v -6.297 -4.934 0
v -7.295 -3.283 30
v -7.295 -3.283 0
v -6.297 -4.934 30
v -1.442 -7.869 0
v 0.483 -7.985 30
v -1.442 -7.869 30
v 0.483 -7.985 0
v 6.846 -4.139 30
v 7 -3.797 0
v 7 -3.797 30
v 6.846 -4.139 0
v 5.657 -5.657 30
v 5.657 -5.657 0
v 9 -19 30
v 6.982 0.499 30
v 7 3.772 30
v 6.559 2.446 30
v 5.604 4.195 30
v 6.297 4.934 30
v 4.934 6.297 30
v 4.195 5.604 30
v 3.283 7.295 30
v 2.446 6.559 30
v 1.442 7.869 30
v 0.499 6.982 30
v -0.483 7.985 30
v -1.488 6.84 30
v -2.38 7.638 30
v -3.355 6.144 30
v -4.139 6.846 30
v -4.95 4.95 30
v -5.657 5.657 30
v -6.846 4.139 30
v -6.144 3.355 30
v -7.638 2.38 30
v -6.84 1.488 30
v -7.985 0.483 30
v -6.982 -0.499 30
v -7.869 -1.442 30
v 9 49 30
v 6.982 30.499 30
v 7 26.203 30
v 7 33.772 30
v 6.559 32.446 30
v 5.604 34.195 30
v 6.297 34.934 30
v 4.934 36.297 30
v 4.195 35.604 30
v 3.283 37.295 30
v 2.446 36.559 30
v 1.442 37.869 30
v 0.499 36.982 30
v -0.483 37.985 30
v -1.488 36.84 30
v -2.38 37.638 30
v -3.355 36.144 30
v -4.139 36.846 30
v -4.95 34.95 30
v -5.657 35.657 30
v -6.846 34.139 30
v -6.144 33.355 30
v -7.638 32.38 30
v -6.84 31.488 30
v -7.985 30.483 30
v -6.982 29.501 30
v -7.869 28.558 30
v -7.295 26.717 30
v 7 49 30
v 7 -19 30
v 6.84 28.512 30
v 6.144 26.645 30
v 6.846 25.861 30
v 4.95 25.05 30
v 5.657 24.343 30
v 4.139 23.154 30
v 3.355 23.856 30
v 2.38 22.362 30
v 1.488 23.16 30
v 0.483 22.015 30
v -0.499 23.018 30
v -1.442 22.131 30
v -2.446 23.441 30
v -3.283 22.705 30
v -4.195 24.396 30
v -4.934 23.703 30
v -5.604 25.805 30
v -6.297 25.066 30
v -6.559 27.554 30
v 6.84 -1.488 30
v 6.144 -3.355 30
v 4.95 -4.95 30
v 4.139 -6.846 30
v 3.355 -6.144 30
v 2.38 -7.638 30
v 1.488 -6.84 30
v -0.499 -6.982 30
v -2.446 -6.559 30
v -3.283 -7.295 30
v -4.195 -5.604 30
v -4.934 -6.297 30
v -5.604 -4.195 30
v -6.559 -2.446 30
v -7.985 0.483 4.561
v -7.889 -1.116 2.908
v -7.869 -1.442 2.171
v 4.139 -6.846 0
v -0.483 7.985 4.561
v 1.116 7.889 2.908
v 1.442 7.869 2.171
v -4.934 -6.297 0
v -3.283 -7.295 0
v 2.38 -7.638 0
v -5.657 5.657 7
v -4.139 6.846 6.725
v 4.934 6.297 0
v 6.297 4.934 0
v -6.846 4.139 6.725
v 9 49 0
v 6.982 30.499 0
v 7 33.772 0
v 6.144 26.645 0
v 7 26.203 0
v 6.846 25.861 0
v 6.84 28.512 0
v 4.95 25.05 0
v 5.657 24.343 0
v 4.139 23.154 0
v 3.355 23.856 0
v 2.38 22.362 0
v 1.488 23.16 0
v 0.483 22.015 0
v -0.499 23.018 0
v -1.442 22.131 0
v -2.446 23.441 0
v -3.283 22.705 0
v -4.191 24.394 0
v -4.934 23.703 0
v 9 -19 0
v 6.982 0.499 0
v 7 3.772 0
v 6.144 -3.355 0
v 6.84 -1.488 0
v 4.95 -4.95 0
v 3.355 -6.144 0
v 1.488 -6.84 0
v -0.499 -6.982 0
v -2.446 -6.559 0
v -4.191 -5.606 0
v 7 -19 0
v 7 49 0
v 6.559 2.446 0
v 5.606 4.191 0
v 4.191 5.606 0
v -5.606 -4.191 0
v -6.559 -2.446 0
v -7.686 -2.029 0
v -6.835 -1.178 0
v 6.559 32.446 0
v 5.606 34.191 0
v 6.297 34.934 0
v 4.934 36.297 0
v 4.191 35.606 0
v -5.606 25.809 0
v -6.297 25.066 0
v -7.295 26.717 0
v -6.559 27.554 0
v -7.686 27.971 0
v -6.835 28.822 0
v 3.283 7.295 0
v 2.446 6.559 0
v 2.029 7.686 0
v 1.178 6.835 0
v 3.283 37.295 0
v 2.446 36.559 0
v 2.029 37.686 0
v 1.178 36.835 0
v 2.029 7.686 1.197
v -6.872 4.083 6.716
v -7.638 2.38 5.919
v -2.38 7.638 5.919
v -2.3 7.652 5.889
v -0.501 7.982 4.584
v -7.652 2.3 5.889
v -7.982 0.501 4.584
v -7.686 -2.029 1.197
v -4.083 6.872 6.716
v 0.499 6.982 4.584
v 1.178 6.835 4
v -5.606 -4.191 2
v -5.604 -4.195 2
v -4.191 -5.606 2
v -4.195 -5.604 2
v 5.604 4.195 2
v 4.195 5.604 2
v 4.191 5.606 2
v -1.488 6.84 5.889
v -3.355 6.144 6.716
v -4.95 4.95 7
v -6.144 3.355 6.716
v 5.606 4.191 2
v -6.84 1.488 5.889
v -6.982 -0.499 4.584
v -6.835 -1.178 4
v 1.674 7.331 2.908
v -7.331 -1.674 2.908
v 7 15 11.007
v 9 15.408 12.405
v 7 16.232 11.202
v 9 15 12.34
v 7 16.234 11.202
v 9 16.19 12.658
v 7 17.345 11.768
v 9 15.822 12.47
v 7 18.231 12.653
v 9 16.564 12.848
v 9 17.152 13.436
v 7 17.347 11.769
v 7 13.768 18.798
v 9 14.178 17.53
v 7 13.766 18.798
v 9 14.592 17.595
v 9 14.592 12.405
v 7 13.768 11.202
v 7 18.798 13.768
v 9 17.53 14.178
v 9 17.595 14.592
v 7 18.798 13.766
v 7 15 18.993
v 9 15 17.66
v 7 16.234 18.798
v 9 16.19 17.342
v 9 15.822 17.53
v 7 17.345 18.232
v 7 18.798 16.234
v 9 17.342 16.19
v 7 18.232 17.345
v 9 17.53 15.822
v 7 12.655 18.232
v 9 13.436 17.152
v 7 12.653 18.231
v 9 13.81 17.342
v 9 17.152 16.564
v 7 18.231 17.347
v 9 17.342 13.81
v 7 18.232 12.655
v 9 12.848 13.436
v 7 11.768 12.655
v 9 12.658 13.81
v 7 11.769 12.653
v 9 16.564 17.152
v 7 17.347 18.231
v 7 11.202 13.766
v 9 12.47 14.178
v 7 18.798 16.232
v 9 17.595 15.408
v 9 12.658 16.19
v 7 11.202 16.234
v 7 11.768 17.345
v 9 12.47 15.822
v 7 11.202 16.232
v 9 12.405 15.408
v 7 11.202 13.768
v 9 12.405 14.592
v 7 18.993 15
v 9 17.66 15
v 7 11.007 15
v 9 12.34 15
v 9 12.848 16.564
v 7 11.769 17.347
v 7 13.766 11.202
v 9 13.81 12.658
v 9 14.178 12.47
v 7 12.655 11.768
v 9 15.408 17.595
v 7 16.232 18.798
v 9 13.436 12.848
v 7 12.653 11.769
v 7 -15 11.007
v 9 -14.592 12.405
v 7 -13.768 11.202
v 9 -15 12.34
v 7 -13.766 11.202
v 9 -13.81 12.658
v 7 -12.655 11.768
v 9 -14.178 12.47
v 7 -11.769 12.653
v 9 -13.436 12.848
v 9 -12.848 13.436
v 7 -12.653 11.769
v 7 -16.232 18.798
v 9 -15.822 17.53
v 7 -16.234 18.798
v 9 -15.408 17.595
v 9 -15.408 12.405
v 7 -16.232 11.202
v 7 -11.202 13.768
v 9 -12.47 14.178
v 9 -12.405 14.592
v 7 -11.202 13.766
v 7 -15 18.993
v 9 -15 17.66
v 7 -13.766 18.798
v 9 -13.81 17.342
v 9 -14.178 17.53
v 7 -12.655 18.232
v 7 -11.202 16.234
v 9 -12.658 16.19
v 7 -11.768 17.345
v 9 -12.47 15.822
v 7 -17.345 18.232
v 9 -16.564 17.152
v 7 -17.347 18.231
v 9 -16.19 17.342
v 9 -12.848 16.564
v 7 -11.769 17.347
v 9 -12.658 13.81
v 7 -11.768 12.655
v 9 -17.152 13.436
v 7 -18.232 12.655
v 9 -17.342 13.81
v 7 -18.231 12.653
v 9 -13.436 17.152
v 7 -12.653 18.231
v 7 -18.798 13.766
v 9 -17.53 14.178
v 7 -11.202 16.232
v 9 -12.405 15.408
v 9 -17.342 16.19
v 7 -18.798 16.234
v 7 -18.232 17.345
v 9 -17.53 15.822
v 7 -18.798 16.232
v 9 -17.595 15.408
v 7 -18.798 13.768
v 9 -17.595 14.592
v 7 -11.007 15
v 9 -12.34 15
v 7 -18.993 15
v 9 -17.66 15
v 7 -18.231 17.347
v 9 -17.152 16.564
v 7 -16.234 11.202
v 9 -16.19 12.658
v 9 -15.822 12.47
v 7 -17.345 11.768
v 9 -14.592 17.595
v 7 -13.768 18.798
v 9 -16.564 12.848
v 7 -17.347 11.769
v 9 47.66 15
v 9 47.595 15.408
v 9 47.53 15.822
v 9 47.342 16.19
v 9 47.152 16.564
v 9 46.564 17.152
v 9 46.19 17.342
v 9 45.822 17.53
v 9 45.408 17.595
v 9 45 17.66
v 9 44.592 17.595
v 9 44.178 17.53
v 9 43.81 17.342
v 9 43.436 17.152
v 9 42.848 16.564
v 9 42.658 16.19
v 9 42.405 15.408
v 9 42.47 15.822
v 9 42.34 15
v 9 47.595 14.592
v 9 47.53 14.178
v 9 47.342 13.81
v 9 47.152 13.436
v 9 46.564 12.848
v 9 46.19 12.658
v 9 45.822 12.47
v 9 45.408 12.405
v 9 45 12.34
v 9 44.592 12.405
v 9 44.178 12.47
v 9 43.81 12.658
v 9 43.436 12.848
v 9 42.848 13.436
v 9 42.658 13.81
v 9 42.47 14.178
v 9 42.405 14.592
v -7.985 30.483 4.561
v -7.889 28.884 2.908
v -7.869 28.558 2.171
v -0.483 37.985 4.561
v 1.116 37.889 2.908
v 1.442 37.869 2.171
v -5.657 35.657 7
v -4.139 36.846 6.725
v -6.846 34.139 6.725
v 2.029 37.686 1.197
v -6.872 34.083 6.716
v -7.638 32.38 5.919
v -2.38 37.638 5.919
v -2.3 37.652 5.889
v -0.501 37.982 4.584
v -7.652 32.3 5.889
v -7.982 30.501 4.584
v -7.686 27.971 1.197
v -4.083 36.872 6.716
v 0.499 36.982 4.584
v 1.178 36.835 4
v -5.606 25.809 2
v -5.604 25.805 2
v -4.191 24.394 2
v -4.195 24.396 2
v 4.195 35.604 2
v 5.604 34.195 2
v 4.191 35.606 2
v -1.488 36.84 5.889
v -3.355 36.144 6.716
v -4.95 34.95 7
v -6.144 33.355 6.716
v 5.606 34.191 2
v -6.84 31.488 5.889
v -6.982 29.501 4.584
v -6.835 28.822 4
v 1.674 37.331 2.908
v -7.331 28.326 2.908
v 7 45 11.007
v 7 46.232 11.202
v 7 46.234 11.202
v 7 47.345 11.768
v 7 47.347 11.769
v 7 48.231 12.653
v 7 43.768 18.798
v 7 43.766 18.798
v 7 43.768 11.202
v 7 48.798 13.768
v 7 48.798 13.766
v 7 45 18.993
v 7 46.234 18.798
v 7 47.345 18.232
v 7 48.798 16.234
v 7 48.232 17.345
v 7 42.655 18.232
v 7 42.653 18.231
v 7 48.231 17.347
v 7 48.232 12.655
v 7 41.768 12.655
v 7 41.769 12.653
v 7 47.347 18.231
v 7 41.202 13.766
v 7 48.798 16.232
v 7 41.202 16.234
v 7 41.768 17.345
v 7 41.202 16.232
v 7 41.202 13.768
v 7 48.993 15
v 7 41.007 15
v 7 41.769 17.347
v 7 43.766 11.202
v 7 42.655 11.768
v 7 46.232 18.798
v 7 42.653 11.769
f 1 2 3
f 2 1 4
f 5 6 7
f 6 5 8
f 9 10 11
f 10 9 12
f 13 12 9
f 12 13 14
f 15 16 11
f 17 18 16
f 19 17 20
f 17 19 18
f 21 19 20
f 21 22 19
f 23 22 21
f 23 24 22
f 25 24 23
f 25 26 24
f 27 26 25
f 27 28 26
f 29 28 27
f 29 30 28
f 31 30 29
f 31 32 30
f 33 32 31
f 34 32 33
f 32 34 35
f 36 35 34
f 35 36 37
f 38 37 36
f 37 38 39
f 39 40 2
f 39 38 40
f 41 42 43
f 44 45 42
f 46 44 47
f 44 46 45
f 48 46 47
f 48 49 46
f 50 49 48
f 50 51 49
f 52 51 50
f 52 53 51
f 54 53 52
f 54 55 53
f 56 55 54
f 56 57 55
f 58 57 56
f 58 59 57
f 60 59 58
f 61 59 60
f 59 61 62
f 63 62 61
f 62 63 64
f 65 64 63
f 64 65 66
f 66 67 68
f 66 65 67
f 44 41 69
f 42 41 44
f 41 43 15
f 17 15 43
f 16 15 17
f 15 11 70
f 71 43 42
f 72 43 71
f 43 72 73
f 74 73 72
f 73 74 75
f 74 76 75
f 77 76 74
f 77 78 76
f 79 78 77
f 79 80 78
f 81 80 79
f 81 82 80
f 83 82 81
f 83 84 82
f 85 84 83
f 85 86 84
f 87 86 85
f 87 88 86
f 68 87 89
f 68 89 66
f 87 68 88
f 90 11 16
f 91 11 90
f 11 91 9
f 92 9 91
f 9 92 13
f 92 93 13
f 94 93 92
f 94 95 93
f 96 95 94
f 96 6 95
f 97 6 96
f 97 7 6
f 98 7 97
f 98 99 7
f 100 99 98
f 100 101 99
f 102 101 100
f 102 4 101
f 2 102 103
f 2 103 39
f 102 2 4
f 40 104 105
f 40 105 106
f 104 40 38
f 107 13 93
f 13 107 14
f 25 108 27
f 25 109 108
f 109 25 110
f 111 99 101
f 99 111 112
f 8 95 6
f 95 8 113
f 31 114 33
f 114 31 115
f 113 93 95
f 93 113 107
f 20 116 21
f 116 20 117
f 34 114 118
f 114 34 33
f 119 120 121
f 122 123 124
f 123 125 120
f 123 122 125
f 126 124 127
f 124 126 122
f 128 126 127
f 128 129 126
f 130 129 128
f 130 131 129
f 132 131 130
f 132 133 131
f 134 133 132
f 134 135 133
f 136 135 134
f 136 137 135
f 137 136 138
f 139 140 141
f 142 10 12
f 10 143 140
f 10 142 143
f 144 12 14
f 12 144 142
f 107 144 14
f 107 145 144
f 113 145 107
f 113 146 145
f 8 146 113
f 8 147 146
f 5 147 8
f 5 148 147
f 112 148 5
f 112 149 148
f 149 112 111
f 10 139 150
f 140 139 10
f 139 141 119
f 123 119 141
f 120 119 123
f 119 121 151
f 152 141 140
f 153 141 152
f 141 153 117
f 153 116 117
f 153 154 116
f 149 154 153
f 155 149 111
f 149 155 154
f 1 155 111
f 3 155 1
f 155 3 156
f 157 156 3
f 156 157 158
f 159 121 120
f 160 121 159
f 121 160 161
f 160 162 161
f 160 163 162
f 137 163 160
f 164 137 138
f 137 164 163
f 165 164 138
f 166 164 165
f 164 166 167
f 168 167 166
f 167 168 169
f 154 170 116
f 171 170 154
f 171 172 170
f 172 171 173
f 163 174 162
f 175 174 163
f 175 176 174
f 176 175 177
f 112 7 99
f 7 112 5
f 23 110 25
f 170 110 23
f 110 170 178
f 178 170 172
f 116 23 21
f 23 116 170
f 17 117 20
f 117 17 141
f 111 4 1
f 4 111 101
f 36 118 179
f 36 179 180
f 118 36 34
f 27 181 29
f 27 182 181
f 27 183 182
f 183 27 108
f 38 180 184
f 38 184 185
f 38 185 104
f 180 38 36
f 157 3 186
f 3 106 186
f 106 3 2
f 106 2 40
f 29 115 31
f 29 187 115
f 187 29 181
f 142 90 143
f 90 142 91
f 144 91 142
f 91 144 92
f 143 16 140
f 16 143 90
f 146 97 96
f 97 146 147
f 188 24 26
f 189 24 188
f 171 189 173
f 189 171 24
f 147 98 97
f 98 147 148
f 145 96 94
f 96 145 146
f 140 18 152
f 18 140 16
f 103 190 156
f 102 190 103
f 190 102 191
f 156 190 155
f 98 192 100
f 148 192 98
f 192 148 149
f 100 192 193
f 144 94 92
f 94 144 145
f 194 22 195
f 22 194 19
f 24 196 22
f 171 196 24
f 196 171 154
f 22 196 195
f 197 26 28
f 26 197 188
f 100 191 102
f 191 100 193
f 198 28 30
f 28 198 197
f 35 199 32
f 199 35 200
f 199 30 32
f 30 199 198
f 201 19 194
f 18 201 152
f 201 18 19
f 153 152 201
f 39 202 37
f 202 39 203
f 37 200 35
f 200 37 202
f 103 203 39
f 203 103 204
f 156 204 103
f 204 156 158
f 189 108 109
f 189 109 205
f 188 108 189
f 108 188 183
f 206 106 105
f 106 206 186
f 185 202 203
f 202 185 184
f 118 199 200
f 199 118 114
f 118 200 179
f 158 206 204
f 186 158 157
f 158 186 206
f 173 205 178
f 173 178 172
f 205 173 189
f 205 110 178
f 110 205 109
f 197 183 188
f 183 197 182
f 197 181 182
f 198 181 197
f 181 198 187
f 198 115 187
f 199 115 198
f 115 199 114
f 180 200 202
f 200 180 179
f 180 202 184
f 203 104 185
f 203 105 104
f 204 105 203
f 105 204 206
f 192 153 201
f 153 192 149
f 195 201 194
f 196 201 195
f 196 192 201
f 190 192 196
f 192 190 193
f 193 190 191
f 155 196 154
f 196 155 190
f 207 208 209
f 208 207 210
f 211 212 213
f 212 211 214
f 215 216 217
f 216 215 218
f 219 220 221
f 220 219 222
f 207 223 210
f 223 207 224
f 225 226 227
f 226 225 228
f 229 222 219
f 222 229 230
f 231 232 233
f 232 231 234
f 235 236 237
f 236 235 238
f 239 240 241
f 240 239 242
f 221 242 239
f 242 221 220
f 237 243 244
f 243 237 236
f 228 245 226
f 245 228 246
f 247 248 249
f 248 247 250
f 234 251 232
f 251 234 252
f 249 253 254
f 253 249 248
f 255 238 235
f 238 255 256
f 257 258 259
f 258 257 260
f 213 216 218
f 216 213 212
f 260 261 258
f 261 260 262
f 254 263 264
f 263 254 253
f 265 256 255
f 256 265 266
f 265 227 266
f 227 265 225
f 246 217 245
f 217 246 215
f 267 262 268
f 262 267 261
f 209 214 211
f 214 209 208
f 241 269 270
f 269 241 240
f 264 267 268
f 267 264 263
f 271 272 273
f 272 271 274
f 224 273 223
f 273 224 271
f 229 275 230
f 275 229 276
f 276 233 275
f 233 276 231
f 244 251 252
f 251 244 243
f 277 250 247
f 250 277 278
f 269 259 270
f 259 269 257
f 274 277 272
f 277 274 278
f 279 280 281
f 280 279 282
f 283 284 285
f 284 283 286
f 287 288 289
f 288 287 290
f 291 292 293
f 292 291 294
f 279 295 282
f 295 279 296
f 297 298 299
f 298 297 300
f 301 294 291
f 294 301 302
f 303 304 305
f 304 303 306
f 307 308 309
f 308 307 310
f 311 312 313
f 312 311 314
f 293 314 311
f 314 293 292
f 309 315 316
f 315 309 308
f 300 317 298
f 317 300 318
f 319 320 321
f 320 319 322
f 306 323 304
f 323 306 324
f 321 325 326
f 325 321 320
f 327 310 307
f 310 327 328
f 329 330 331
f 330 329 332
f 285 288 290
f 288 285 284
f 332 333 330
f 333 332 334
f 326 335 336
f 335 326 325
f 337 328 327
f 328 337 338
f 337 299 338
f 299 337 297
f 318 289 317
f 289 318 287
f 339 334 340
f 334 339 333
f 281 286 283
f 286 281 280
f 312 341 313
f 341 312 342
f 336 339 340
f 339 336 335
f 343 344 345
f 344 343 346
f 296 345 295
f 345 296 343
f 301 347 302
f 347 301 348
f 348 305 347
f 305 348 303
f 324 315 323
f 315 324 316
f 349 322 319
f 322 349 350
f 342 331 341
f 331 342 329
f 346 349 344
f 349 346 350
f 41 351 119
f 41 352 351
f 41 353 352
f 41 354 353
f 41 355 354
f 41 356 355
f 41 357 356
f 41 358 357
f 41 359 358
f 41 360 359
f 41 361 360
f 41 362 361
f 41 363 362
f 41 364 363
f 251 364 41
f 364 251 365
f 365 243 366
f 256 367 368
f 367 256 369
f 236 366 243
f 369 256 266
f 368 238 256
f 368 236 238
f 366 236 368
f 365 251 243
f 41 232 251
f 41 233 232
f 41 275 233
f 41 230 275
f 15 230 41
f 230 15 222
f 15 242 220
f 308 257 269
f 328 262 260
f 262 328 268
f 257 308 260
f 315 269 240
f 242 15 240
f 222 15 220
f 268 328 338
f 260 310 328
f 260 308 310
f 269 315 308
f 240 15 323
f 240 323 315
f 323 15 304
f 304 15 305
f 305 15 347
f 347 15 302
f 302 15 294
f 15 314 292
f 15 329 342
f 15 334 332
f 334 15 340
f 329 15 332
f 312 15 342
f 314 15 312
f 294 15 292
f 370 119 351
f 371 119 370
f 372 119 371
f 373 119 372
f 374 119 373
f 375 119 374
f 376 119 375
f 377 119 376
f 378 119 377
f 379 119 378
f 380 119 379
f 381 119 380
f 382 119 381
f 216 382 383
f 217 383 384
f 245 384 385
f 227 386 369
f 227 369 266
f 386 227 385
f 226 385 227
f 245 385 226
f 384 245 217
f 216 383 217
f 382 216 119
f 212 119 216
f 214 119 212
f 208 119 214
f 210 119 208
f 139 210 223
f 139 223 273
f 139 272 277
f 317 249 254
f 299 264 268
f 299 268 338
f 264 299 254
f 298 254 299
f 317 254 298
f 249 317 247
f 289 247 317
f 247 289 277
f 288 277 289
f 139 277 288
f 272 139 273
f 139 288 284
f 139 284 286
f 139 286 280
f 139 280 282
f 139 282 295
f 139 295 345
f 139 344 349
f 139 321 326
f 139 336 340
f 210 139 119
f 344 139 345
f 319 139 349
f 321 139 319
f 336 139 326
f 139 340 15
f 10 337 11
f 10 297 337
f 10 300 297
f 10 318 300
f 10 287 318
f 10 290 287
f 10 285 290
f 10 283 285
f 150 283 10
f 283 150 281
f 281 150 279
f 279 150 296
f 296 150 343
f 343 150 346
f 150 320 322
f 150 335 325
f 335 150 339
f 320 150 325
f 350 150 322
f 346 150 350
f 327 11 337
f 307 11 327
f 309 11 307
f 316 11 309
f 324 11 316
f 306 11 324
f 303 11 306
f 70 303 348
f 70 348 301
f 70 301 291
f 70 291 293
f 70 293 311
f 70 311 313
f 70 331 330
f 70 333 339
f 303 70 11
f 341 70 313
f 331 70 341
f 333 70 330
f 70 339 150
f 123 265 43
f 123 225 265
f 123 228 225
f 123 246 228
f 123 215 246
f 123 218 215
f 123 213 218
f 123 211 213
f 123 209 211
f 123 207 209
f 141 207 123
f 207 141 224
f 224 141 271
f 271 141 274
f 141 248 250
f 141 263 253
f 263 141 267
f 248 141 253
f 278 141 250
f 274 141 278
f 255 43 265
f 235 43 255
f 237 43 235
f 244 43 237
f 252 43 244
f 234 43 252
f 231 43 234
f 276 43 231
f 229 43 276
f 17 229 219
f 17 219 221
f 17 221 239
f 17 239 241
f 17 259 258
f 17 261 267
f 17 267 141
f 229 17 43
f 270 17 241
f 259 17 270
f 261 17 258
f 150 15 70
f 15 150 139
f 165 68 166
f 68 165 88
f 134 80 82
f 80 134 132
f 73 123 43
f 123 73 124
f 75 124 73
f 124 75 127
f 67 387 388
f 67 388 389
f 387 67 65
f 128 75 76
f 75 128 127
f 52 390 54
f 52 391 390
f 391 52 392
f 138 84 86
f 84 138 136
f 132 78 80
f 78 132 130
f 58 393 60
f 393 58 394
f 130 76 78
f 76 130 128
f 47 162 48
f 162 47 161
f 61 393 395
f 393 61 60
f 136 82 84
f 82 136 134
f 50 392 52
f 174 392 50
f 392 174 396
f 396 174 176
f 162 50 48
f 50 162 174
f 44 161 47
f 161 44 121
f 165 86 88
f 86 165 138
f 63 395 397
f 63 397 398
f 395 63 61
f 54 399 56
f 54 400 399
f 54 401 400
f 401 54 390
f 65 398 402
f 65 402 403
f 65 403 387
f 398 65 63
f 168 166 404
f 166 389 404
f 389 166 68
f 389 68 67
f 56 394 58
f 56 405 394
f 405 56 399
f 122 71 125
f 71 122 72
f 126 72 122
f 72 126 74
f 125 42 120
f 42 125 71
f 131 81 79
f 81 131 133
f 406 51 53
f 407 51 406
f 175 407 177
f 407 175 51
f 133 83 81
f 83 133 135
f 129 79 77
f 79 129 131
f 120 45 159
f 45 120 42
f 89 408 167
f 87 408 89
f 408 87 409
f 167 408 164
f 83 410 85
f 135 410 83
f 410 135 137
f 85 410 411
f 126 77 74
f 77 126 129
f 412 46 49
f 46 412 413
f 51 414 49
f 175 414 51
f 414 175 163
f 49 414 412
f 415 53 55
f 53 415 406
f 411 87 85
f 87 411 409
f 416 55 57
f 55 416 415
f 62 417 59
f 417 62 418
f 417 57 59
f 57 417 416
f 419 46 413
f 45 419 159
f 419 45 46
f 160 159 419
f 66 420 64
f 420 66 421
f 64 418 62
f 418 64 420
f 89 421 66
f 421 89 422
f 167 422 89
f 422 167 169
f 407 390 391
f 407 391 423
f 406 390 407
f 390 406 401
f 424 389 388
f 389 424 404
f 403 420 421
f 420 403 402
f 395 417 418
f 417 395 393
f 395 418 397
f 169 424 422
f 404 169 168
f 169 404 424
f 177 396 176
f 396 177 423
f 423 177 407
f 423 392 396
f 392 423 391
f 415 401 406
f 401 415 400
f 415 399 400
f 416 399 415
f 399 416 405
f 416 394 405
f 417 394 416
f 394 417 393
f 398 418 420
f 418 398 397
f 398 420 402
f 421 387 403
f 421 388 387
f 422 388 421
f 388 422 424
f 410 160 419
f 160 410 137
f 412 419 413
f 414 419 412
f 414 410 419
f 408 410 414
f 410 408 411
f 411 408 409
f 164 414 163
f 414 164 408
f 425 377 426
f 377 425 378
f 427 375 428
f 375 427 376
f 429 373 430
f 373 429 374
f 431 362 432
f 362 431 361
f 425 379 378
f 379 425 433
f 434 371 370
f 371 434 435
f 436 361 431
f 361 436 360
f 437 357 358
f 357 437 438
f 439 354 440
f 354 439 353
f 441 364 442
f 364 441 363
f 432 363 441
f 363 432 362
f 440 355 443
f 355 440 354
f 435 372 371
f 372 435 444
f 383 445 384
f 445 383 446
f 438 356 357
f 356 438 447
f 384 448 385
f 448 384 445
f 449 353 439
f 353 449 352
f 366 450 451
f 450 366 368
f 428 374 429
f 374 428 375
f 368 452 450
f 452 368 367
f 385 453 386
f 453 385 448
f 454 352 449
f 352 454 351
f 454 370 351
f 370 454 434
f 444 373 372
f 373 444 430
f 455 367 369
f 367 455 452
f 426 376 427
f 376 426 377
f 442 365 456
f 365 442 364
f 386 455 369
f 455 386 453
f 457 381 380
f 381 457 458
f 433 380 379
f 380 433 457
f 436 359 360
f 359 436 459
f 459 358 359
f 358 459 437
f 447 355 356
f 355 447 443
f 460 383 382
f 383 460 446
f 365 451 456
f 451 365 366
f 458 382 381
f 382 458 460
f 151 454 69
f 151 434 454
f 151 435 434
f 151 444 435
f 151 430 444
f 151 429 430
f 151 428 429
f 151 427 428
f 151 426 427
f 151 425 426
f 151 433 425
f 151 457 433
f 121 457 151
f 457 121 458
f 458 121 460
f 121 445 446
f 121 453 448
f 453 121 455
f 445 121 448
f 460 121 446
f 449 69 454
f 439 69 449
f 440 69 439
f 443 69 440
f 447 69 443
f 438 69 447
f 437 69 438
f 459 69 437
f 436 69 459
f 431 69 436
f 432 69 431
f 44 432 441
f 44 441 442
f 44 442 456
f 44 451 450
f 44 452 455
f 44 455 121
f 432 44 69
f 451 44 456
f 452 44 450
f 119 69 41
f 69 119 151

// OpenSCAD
// Cup holder
//$fn = 50;
cup_d1 = 14;
cup_d2 = 14;
cup_h = 30;
cup_w = 2;

mount_x = 2;
mount_y = cup_d1*2+10;
mount_z = cup_h;
mount_x_offset = mount_x;

module screw_countersunk(
        l=20,   //length
        dh = 8,   //head dia
        lh = 3,   //head length
        ds = 4,  //shaft dia
        $fn=20,
        )
{
    union() {
        cylinder(h=lh, r1=dh/2, r2=ds/2);
        cylinder(h=l, d=ds);
    }
}

module outer_cup_mount() {
  outer_d = cup_d1 + cup_w;
  cylinder(d=outer_d, h=cup_h);
  
    
}

module inner_cup_mount() {
    cylinder(d1=cup_d1, d2=cup_d2, h=cup_h);
}
    
module wall_mount() {
    difference() {
    cube([mount_x, mount_y, mount_z], center=true);
    translate([-0.5*mount_x-0.01, 0.5*(mount_y-8), 0]) 
      rotate([0, 90, 0]) 
        screw_countersunk();
    translate([-0.5*mount_x-0.01, -0.5*(mount_y-8), 0]) 
      rotate([0, 90, 0]) 
        screw_countersunk();
    }
    //translate([-0.5*mount_x_offset, 0, -0.5*(mount_z-cup_h)]) cube([mount_x_offset, mount_y, cup_h], center=true);
}


module holder() {
rotate([0, 0, -45]) {
    difference() {
    outer_cup_mount();
    inner_cup_mount();
    translate([-0.5*(cup_d1+cup_w), 0, 0]) rotate([0, 90, 0]) cylinder(h=2*cup_w, d=1*cup_d1);
}
    //cylinder(h=cup_w+5, d=5);
    
    y = cup_d2+0.5*cup_w;
    x = cup_w;
    translate([-0.5*x, -0.5*y, 0]) cube([x, y, cup_w]);
  }
    translate([0.5*(cup_d1+mount_x), 0, 0.5*cup_h]) wall_mount();
}

holder();
translate([0, mount_y-8, 0]) holder();
